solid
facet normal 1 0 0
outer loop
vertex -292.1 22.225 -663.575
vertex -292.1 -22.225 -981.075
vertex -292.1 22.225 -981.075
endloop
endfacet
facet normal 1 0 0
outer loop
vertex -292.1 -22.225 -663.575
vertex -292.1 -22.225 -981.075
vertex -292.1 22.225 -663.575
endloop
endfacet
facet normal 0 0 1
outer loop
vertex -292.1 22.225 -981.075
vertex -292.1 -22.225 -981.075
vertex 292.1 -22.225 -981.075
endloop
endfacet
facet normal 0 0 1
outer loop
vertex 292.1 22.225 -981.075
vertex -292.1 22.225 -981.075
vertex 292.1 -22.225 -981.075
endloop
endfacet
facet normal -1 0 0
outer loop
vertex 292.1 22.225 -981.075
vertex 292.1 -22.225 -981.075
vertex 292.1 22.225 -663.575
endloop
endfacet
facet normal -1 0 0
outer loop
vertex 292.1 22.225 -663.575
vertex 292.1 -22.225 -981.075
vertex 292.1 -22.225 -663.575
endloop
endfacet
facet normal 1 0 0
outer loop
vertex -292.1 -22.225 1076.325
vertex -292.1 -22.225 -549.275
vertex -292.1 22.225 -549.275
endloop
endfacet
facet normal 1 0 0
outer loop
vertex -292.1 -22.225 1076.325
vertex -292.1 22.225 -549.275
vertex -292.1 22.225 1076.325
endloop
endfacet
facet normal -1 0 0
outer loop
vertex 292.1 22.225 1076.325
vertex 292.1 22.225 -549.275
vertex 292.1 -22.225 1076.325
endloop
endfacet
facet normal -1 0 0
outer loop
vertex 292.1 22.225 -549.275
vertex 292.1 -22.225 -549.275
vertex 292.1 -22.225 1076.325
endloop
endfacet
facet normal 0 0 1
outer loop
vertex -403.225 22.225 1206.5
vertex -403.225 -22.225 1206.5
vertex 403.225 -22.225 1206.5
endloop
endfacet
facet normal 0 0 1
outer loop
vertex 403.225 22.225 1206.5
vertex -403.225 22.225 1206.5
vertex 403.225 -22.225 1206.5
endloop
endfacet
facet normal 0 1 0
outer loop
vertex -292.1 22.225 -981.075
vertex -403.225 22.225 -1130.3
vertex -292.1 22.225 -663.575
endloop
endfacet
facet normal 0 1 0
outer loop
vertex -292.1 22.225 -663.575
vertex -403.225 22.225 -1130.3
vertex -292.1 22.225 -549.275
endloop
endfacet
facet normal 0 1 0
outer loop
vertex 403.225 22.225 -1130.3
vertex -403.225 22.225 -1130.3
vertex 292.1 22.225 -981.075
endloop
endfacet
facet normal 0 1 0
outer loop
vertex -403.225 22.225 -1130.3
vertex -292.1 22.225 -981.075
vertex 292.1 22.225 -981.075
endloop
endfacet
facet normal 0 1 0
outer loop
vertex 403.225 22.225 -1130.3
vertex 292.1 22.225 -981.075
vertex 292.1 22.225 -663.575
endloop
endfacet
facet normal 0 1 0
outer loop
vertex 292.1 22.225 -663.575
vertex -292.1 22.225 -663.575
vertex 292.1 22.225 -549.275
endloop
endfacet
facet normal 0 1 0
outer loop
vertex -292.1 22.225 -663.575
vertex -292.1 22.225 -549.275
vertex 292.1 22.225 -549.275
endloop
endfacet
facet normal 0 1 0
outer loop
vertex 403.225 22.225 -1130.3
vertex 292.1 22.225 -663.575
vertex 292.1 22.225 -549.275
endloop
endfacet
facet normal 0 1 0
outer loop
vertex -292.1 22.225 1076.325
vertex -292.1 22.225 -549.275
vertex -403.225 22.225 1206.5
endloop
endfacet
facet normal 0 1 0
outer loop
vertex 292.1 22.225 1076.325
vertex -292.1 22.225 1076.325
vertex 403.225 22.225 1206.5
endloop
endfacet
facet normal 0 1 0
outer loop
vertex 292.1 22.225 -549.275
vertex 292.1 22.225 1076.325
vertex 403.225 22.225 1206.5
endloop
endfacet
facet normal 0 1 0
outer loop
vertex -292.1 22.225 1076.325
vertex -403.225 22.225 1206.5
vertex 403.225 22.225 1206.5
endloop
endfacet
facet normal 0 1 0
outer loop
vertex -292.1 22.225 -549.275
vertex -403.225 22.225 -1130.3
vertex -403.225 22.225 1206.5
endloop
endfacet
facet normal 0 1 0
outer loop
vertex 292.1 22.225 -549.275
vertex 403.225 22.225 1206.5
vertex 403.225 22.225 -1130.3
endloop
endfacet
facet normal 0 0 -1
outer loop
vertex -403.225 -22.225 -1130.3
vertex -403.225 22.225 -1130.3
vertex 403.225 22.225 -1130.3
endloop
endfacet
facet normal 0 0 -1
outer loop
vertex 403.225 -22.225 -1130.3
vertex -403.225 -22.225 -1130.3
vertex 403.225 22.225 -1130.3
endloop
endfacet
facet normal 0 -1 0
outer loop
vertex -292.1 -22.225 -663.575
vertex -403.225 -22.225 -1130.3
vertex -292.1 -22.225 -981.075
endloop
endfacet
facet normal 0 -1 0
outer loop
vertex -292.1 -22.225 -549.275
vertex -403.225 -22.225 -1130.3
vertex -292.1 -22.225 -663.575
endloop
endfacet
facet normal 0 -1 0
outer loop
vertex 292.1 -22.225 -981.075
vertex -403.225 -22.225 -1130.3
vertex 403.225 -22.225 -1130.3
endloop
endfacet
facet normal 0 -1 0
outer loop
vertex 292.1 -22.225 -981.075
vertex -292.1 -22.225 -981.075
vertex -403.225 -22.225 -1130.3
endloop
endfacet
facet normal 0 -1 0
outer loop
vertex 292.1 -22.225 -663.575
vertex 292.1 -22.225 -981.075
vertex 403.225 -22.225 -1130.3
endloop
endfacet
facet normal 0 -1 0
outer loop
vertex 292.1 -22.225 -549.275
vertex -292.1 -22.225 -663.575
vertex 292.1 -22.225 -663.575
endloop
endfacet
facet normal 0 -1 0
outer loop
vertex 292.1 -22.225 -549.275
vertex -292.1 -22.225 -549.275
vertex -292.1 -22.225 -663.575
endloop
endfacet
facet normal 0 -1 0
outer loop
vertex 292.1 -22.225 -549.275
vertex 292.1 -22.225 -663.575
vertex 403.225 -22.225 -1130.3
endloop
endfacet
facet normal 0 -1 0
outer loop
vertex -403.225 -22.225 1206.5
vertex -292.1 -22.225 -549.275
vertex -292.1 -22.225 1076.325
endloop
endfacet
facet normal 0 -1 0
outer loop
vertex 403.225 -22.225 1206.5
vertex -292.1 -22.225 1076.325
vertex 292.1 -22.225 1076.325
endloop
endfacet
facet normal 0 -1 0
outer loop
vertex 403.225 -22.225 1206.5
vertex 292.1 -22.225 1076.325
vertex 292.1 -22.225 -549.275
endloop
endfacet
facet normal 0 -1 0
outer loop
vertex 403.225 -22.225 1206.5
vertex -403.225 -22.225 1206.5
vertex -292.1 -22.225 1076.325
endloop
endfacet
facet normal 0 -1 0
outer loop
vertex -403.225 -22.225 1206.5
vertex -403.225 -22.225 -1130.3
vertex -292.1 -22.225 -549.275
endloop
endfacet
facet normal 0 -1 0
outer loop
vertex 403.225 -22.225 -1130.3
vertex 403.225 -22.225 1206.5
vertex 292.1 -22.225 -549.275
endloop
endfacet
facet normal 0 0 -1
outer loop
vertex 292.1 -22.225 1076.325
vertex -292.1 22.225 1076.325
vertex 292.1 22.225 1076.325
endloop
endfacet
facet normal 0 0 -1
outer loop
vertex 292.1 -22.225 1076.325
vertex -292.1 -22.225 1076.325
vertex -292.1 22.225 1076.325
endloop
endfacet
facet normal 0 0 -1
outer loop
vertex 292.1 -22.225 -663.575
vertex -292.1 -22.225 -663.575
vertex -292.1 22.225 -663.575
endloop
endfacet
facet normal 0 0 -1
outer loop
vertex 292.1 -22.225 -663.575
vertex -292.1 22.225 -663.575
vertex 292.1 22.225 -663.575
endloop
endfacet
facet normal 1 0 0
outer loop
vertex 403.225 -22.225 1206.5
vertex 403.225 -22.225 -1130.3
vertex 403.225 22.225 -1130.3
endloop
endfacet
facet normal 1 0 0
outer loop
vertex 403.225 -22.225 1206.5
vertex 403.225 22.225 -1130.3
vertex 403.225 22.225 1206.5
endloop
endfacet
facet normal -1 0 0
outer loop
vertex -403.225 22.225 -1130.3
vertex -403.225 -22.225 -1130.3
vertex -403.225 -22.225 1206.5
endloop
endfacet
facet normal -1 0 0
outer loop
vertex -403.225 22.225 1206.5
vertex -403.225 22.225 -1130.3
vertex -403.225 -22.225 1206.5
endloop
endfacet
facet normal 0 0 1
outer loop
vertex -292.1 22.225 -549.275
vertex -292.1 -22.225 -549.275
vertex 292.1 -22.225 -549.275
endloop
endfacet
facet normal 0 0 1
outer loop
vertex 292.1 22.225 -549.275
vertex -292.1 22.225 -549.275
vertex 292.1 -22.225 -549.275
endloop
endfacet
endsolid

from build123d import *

# Parameters (mm, degrees)
F0_W          = 806.45
F0_H          = 2413
F0_W_2        = 584.2
F0_H_2        = 317.5
F0_H_3        = 1625.6
F1_DEPTH      = 22.225
F1_DEPTH_BACK = 22.225
F2_W          = 1248.5843106929
F2_H          = 271.0993243682
F2_H_2        = 504.0157202398
F3_DEPTH      = 22.226
F3_DEPTH_BACK = 22.226


# Not quite as in the source:
# - a length typed as a fraction of an inch, garbled in the dataset ("3 / 203.2 mm" for 3/8 in), is restored


with BuildPart() as f1:
    # F0 (on Front) → F1 (new body, two sides)
    with BuildSketch(Plane.XZ) as f1_sk:
        Rectangle(F0_W, F0_H)
        with Locations((0, -822.325)):
            Rectangle(F0_W_2, F0_H_2, mode=Mode.SUBTRACT)
        with Locations((0, 263.525)):
            Rectangle(F0_W_2, F0_H_3, mode=Mode.SUBTRACT)
    extrude(amount=F1_DEPTH)
    extrude(f1_sk.sketch, amount=-F1_DEPTH_BACK)

    # F2 (on Front) → F3 (cut, two sides)
    with BuildSketch(Plane.XZ) as f3_sk:
        with Locations((62.8663003445, 1342.0496621841)):
            Rectangle(F2_W, F2_H)
        with Locations((62.8663003445, -1382.3078601199)):
            Rectangle(F2_W, F2_H_2)
    extrude(amount=-F3_DEPTH, mode=Mode.SUBTRACT)
    extrude(f3_sk.sketch, amount=F3_DEPTH_BACK, mode=Mode.SUBTRACT)


solid = f1.part
